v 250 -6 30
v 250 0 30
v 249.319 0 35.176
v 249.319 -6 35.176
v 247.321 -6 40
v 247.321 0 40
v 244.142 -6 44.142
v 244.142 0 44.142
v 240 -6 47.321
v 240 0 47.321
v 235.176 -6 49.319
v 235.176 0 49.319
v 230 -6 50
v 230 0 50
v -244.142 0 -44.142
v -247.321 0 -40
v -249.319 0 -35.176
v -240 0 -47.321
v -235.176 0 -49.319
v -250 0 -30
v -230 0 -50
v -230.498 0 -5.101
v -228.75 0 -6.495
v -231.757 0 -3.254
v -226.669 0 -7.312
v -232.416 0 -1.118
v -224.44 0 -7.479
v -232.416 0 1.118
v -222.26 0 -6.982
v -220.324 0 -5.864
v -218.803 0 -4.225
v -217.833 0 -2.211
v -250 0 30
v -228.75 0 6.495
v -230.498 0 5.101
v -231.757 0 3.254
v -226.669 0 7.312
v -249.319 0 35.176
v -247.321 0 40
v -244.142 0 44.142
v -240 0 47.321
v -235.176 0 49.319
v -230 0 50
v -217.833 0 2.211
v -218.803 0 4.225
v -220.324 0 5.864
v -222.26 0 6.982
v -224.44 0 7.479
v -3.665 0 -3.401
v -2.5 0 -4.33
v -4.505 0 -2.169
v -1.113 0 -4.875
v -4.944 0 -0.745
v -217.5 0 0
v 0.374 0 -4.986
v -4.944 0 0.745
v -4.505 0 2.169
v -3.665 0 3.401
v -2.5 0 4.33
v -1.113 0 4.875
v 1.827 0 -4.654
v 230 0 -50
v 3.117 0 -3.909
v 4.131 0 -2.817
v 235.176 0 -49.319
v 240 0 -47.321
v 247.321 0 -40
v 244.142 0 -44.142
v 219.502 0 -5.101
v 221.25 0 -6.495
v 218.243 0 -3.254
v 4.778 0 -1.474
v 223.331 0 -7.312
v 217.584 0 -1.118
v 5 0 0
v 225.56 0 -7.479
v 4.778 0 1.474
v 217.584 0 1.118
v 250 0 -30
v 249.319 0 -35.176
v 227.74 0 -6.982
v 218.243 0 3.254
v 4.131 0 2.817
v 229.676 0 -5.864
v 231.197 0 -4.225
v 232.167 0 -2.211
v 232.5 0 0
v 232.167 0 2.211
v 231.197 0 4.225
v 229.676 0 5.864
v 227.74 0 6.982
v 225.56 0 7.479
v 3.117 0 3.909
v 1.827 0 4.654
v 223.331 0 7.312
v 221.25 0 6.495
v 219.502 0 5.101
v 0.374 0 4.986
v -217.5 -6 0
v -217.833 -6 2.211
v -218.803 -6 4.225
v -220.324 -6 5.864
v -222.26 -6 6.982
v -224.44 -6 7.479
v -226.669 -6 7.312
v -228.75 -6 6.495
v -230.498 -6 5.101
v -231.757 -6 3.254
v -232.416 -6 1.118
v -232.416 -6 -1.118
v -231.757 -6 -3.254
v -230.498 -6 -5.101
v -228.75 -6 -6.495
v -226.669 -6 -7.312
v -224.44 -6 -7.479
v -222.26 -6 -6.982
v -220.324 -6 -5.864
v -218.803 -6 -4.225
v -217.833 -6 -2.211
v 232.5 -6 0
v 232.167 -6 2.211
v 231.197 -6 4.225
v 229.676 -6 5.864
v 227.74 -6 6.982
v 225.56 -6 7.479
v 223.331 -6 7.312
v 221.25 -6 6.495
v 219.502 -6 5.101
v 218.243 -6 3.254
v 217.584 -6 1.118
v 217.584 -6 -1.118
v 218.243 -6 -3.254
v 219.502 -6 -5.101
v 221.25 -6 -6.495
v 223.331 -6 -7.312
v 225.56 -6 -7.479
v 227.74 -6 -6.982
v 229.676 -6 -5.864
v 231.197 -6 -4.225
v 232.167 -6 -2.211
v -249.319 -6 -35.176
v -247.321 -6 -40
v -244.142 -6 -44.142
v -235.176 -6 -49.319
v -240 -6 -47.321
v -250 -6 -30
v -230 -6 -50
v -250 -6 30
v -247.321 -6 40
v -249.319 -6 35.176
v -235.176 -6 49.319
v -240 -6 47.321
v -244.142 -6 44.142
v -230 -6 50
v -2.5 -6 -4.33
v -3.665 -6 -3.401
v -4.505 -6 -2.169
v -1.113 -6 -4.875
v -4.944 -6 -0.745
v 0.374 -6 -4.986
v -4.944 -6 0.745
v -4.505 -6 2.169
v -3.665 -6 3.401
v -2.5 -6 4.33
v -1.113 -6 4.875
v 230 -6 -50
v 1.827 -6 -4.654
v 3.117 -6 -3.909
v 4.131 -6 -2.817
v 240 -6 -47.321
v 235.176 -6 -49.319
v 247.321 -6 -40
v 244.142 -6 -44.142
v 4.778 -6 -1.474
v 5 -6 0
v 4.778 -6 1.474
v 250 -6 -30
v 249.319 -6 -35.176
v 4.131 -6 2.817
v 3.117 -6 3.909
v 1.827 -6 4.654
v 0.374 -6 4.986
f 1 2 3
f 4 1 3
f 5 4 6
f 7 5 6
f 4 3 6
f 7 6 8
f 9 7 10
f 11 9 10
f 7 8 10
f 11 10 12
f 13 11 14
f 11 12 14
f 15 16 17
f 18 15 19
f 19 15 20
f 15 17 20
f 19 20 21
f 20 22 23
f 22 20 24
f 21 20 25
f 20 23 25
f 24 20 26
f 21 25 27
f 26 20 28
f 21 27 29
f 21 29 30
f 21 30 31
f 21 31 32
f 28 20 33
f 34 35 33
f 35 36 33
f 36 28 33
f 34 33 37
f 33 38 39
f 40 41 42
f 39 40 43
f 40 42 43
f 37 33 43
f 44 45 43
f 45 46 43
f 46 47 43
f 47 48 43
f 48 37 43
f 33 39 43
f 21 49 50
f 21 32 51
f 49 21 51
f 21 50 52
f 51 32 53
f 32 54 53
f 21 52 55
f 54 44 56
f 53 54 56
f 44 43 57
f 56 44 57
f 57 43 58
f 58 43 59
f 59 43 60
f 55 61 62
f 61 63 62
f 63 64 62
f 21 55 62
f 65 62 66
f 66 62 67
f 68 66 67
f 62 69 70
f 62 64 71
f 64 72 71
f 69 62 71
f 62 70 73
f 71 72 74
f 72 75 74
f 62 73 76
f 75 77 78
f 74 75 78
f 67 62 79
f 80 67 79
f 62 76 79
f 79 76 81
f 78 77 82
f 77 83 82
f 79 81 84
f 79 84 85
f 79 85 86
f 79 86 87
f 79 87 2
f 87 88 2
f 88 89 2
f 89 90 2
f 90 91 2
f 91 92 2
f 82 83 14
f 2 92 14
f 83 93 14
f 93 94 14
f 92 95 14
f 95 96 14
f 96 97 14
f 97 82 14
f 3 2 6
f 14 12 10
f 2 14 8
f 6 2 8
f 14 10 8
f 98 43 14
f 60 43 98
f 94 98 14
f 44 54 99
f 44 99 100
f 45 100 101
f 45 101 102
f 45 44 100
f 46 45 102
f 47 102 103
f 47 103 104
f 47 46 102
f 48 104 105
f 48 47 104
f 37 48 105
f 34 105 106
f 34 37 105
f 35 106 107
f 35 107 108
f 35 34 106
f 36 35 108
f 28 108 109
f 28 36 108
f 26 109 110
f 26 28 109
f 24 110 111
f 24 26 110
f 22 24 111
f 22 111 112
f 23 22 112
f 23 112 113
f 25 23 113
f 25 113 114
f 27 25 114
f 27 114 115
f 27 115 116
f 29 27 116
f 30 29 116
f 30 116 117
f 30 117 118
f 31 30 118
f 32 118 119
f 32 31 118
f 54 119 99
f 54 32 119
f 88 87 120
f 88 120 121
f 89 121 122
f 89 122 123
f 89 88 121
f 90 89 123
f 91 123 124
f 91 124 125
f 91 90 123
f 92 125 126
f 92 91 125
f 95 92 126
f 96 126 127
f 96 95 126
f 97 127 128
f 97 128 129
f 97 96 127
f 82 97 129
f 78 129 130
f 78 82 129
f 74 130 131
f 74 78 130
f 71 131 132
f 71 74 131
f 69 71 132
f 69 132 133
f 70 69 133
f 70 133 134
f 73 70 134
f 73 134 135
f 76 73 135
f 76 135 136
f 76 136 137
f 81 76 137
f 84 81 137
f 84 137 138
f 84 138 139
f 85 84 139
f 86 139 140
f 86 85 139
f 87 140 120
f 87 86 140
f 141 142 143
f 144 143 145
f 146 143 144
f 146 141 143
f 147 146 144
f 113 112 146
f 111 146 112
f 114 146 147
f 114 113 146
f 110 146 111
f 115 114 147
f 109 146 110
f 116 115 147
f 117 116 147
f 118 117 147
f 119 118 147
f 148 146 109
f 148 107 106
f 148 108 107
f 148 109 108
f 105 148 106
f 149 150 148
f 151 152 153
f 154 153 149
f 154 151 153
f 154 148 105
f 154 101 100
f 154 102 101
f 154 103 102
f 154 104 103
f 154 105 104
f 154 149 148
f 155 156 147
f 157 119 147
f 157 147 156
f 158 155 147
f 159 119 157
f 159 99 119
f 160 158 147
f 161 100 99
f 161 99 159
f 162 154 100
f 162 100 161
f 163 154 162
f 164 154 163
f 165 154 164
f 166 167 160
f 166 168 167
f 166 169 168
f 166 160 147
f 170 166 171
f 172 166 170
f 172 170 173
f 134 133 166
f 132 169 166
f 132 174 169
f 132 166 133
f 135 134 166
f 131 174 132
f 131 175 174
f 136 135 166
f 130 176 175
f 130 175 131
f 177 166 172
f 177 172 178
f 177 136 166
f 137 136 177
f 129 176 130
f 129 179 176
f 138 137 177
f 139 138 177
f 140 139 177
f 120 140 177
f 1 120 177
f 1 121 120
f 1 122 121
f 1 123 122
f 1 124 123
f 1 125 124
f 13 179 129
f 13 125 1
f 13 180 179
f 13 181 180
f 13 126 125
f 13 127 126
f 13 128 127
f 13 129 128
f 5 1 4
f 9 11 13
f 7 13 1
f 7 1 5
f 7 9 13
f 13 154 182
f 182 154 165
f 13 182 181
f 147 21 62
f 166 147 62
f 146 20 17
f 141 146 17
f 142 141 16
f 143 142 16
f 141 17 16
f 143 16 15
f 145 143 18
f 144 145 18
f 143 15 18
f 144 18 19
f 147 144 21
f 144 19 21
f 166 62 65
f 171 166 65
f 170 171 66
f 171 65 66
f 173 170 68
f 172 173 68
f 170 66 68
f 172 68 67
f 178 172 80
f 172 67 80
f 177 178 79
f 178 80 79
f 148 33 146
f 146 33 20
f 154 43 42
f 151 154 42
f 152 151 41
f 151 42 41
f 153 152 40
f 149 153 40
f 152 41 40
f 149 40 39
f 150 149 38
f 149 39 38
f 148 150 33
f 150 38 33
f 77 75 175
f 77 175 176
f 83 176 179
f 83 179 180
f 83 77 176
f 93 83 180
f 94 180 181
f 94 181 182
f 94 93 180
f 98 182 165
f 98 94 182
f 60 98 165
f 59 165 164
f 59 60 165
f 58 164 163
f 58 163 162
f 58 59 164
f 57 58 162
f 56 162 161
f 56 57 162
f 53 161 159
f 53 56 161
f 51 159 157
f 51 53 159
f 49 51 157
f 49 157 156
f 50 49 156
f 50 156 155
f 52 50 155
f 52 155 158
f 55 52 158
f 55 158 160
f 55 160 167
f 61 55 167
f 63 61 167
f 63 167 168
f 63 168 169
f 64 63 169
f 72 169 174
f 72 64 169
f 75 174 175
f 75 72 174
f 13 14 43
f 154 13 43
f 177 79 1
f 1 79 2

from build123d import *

# Parameters (mm, degrees)
F0_R     = 7.5
F0_R_2   = 5
F1_DEPTH = 6


with BuildPart() as f1:
    # F0 (on Front) → F1 (new body)
    with BuildSketch(Plane.XZ):
        with BuildLine():
            ThreePointArc((-230, 50), (-244.142136, 44.142136), (-250, 30))
            Line((-250, 30), (-250, -30))
            ThreePointArc((-250, -30), (-244.142136, -44.142136), (-230, -50))
            Line((-230, -50), (230, -50))
            ThreePointArc((230, -50), (244.142136, -44.142136), (250, -30))
            Line((250, -30), (250, 30))
            ThreePointArc((250, 30), (244.142136, 44.142136), (230, 50))
            Line((230, 50), (-230, 50))
        make_face()
        with Locations((-225, 0)):
            Circle(F0_R, mode=Mode.SUBTRACT)
        Circle(F0_R_2, mode=Mode.SUBTRACT)
        with Locations((225, 0)):
            Circle(F0_R, mode=Mode.SUBTRACT)
    extrude(amount=F1_DEPTH)


solid = f1.part
